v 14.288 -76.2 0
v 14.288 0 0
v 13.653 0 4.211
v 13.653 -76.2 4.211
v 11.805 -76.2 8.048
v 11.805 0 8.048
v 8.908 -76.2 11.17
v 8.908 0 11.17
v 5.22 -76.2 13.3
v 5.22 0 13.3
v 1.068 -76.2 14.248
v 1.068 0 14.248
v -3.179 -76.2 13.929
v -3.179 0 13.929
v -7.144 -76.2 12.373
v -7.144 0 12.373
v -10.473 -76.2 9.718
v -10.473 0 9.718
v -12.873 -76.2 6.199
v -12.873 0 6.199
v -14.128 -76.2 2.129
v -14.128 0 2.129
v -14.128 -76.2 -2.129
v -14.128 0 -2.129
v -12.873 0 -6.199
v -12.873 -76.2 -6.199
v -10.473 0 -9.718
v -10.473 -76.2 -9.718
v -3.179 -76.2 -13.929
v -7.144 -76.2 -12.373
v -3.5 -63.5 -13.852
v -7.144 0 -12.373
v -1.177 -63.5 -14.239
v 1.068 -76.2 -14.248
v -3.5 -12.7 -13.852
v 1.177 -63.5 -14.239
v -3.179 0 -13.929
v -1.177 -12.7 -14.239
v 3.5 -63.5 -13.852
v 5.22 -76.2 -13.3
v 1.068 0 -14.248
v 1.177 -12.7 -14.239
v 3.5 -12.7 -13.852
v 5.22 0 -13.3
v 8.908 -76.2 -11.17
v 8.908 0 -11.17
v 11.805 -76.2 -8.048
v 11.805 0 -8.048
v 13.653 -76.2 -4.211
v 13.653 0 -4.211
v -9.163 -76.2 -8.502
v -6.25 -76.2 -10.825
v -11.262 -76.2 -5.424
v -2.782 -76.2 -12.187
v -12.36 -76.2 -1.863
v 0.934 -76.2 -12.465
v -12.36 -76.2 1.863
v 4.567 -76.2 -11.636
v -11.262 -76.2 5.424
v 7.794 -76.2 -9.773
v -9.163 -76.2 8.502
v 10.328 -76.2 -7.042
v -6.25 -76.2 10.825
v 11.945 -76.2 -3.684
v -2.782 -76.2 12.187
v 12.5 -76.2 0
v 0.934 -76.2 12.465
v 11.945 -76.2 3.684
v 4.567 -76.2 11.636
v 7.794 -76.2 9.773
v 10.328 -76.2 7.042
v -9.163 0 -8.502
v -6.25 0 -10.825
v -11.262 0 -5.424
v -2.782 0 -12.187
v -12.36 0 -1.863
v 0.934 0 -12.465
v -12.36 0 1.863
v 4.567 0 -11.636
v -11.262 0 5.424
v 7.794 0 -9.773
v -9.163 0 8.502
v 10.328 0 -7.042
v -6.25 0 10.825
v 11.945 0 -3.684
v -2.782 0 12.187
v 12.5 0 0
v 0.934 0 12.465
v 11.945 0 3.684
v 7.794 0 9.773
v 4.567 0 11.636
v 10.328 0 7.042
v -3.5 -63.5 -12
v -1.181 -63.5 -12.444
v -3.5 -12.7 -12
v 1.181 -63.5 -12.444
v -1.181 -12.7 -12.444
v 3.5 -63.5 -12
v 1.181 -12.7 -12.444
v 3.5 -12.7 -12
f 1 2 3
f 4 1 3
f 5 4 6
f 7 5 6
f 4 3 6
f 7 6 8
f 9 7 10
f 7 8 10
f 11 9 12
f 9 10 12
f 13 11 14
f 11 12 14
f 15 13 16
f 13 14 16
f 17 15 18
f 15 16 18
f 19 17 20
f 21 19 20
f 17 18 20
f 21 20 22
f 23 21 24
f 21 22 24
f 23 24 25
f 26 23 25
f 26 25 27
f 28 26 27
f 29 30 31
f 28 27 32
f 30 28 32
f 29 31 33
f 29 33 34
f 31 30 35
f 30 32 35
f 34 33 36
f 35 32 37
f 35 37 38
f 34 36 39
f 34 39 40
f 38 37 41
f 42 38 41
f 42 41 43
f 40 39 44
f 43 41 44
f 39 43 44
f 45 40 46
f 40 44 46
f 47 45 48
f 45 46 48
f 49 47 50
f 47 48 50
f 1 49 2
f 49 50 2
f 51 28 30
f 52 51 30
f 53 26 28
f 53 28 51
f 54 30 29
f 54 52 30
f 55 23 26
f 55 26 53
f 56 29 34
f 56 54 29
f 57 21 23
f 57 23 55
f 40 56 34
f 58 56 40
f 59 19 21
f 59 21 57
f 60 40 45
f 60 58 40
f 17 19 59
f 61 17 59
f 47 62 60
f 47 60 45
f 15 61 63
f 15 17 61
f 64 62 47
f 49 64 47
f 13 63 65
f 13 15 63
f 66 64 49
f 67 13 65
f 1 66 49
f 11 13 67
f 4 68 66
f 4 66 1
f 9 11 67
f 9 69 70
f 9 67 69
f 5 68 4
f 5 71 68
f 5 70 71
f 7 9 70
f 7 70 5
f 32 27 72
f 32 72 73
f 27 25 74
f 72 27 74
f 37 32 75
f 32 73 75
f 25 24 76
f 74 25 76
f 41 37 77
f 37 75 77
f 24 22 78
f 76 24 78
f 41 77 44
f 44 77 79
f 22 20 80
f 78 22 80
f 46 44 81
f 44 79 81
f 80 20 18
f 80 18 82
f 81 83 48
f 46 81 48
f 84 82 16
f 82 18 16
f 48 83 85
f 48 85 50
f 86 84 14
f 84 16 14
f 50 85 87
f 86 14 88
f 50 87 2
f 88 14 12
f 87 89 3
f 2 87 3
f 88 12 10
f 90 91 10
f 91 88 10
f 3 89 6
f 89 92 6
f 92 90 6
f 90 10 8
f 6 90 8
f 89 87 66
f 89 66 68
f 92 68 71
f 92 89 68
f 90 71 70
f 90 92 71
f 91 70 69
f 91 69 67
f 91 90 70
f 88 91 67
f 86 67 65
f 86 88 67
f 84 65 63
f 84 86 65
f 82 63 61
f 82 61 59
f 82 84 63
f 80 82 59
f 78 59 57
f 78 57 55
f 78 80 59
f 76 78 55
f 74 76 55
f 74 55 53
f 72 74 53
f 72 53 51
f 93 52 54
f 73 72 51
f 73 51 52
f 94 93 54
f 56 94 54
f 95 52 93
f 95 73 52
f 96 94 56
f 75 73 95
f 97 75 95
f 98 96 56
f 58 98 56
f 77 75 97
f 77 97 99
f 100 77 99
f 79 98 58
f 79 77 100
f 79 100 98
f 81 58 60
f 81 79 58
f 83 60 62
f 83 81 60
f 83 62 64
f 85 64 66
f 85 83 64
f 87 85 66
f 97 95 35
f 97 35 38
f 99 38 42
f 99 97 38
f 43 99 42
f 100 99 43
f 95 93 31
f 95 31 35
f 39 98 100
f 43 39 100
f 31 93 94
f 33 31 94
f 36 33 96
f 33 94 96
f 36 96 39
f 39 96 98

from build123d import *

# Parameters (mm, degrees)
F0_R     = 14.2875
F0_R_2   = 12.5
F1_DEPTH = 76.2
F2_W     = 7
F2_H     = 50.8
F3_DEPTH = 14.2885


with BuildPart() as f1:
    # F0 (on Front) → F1 (new body)
    with BuildSketch(Plane.XZ):
        Circle(F0_R)
        Circle(F0_R_2, mode=Mode.SUBTRACT)
    extrude(amount=F1_DEPTH)

    # F2 (on Top) → F3 (cut, through all)
    with BuildSketch(Plane.XY):
        with Locations((0, -38.1)):
            Rectangle(F2_W, F2_H)
    extrude(amount=-F3_DEPTH, mode=Mode.SUBTRACT)


solid = f1.part
